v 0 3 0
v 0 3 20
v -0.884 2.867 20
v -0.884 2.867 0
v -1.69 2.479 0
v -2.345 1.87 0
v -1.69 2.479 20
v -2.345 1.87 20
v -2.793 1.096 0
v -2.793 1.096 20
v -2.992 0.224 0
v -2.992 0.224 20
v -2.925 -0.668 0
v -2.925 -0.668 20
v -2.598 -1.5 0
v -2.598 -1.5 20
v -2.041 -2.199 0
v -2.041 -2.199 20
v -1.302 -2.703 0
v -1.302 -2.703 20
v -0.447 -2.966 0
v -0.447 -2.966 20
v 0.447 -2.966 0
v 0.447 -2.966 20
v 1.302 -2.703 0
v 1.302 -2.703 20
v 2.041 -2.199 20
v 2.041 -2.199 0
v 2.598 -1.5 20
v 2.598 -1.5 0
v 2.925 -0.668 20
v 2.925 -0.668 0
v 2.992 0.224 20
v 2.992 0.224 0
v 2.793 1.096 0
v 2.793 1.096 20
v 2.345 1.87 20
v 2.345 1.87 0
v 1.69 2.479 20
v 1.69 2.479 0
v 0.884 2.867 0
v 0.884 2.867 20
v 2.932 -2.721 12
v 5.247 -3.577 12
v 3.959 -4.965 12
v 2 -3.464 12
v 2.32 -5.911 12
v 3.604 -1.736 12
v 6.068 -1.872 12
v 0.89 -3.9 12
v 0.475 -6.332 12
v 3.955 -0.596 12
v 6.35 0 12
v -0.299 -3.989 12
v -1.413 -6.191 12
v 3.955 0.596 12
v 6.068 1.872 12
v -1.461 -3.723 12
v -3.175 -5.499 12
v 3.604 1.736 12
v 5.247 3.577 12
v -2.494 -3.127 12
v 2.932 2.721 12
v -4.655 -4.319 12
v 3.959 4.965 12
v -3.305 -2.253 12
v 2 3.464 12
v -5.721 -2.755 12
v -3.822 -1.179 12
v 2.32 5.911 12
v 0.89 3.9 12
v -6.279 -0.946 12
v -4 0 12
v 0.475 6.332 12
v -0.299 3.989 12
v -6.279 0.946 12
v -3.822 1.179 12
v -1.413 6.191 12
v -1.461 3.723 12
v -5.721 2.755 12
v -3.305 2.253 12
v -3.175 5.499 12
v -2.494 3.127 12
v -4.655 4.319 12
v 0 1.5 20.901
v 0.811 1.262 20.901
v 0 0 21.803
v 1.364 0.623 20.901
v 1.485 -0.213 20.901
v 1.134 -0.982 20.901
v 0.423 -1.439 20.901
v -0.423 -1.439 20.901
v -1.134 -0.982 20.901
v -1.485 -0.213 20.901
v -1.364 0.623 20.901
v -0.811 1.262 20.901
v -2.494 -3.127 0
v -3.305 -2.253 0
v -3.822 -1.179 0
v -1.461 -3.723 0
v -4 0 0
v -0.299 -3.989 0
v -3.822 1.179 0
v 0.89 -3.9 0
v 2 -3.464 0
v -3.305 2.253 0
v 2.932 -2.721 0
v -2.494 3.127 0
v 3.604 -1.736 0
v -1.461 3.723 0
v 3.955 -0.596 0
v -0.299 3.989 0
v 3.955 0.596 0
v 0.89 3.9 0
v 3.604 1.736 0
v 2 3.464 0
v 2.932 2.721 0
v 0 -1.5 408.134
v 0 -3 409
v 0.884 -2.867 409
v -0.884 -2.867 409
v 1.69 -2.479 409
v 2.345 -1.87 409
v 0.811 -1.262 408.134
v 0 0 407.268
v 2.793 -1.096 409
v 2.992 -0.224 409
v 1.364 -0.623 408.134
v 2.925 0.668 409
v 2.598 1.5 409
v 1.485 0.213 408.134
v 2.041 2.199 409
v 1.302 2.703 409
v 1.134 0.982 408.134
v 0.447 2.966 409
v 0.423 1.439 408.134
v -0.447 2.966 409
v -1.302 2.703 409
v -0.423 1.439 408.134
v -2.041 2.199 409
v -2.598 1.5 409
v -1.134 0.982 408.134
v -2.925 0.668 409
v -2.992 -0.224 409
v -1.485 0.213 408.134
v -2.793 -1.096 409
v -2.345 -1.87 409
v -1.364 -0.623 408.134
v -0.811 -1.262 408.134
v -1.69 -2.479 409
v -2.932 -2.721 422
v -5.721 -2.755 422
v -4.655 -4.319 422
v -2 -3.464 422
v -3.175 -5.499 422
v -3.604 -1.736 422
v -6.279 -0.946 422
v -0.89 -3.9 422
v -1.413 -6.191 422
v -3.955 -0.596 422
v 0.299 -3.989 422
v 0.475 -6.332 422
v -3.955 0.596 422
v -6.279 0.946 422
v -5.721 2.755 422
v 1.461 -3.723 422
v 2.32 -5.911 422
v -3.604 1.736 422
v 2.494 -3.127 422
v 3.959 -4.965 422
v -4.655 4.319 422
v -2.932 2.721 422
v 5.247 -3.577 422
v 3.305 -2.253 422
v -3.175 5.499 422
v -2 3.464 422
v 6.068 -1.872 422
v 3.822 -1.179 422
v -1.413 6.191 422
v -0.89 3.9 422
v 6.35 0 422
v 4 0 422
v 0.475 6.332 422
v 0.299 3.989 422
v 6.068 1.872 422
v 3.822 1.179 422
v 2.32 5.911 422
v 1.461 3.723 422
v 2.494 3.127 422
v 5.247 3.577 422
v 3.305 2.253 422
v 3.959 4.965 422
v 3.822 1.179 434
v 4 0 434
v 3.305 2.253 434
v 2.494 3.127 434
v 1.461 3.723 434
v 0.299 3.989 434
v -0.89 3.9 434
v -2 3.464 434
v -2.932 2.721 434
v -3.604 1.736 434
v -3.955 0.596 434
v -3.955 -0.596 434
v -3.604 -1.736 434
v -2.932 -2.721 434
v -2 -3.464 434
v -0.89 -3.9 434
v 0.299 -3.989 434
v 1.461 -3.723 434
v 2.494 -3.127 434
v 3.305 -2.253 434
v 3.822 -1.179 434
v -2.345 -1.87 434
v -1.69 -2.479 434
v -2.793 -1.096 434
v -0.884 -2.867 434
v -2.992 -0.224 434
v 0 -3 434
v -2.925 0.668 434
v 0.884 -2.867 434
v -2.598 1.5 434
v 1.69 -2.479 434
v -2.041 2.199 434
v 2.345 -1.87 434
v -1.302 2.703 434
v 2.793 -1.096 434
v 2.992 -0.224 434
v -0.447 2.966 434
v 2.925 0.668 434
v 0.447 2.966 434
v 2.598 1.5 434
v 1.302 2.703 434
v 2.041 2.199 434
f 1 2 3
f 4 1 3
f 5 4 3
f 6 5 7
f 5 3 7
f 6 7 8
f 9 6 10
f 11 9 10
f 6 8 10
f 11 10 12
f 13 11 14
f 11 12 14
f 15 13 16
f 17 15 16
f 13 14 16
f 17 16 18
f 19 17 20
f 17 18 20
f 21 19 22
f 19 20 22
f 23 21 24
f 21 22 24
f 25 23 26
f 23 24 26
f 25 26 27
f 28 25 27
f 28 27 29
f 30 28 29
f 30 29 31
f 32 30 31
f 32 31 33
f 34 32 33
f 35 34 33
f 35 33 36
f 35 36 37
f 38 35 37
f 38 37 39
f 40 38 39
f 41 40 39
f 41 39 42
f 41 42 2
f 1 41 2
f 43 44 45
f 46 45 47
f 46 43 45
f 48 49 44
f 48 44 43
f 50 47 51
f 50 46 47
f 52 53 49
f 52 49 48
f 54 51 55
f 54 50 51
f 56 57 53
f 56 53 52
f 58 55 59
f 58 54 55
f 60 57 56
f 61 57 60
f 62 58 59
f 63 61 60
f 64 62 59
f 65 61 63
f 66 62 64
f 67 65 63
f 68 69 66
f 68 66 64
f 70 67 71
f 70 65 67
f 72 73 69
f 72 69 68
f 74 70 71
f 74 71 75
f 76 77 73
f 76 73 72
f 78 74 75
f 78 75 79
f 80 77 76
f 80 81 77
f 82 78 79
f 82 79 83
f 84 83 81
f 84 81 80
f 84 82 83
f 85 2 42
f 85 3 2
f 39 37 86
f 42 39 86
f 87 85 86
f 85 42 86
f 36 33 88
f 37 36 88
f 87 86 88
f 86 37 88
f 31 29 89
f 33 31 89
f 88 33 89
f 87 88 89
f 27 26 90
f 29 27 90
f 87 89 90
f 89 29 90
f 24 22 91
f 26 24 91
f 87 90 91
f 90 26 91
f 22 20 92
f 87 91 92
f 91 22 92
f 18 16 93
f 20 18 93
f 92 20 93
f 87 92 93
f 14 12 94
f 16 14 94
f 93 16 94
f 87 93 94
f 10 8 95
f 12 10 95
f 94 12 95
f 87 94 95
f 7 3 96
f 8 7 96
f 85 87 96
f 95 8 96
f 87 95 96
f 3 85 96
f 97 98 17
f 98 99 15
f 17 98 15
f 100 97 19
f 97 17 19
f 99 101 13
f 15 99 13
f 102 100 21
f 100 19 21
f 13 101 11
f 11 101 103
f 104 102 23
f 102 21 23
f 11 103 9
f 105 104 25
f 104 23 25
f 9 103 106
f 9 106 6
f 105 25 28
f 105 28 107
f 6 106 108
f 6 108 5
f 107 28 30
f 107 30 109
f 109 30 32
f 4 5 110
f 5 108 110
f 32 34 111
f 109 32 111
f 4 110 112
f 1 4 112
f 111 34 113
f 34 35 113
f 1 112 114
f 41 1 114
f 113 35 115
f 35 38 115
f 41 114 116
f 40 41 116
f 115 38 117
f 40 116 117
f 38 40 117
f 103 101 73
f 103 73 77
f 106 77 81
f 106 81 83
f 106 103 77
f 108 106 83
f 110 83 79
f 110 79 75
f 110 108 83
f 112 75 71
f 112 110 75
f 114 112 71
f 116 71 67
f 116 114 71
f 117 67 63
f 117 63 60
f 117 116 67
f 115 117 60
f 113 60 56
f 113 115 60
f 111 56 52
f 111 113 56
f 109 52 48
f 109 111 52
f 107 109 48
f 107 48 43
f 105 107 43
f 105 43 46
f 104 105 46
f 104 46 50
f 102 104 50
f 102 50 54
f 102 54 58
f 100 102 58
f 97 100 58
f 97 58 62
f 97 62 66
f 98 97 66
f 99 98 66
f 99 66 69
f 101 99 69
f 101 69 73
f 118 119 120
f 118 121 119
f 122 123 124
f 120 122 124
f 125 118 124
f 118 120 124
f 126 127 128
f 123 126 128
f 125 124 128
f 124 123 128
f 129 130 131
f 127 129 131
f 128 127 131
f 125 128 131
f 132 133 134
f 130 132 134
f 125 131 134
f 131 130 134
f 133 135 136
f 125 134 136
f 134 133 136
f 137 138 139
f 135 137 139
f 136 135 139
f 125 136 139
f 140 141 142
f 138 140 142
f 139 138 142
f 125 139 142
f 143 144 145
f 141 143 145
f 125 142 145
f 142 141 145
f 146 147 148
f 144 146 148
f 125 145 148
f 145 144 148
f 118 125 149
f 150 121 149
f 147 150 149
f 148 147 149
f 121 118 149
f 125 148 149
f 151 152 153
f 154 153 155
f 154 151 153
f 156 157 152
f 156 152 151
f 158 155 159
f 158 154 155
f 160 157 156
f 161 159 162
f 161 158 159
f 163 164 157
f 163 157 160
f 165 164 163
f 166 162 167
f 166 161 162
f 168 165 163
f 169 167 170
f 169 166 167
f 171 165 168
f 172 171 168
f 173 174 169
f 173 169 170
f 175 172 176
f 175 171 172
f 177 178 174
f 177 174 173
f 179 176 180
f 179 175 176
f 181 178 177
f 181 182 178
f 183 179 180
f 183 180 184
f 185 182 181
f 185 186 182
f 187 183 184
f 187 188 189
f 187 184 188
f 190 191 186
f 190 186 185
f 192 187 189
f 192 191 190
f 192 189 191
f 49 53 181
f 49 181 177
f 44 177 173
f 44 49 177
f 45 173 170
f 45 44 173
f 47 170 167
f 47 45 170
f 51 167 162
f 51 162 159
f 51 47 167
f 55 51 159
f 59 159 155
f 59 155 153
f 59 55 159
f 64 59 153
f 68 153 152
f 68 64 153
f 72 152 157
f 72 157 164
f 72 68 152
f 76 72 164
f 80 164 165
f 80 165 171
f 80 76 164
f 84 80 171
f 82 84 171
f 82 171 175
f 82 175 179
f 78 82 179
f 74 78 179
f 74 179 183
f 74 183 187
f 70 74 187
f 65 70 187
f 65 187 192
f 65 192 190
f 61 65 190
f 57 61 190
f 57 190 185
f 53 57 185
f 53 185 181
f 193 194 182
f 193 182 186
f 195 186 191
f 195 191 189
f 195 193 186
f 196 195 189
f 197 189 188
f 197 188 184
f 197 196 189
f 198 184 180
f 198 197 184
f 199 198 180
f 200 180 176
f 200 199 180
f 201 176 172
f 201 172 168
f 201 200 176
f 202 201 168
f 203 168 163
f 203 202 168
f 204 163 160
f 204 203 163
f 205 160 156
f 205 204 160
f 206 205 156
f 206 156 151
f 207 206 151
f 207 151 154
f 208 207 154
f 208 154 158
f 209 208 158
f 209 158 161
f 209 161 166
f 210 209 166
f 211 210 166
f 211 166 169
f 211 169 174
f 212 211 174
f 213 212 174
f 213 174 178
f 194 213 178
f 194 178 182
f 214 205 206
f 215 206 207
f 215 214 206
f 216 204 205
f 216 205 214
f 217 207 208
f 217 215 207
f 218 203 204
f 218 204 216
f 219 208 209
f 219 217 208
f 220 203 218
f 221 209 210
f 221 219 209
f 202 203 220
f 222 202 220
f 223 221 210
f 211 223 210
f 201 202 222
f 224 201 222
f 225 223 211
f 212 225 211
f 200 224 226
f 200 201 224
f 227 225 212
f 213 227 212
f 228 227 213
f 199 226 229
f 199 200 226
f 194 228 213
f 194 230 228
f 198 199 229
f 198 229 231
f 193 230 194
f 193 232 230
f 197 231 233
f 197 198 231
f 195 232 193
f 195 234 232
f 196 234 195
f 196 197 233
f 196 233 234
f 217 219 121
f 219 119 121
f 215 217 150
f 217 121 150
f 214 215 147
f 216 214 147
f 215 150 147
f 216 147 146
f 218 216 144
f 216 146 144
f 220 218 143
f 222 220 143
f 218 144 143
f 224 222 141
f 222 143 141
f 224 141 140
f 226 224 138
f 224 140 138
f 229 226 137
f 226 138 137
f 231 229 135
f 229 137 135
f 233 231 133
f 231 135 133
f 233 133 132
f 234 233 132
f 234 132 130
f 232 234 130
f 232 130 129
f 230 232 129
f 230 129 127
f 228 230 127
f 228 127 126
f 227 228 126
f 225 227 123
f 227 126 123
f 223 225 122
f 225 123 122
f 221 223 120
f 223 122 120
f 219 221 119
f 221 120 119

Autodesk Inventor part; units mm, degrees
ref_plane "YZ Plane" through (0, 0, 0) normal (1, 0, 0) x (0, 1, 0)
ref_plane "XZ Plane" through (0, 0, 0) normal (0, 1, 0) x (-1, 0, 0)
ref_plane "XY Plane" through (0, 0, 0) normal (0, 0, 1) x (1, 0, 0)
sketch "Sketch1" plane through (0, 0, 0) normal (0, 0, 1) x (1, 0, 0)
  circle A0 centre (0, 0) radius 6.35
  circle A1 centre (0, 0) radius 3
  dimension "d0" = 12.7
  dimension "d1" = 6
extrude "Extrusion1" add sketch "Sketch1" along normal blind 434 contours A0 | A1
sketch "Sketch2" plane through (0, 0, 434) normal (0, 0, 1) x (1, 0, 0)
  circle A0 centre (0, 0) radius 3
  dimension "d4" = 6
sketch "Sketch3" plane through (0, 0, 0) normal (0, 0, -1) x (-1, 0, 0)
  circle A0 centre (0, 0) radius 3
  dimension "d7" = 6
hole "Agujero1" at (0, 0, 434) direction (0, 0, -1) diameter 6 depth 25 tip angle 120
hole "Agujero2" at (0, 0, 0) direction (0, 0, 1) diameter 6 depth 20 tip angle 118
thread "Rosca3" size "M6x1" class "6H" standard "ISO Metric profile" length 20
thread "Rosca4" size "M6x1" class "6H" standard "ISO Metric profile" length 25
sketch "Sketch4" plane through (0, 0, 434) normal (0, 0, 1) x (1, 0, 0)
  circle A0 centre (0, 0) radius 4
  circle A1 centre (0, 0) radius 6.5
  dimension "d32" = 8
  dimension "d38" = 13
extrude "Extrusion4" cut sketch "Sketch4" against normal blind 12
sketch "Sketch5" plane through (0, 0, 0) normal (0, 0, -1) x (-1, 0, 0)
  circle A0 centre (0, 0) radius 4
  circle A1 centre (0, 0) radius 6.5
  dimension "d35" = 8
  dimension "d39" = 13
extrude "Extrusion5" cut sketch "Sketch5" against normal blind 12
properties part number "Guías de Vínculo Cabezal" material "Steel, High Strength, Low Alloy"
